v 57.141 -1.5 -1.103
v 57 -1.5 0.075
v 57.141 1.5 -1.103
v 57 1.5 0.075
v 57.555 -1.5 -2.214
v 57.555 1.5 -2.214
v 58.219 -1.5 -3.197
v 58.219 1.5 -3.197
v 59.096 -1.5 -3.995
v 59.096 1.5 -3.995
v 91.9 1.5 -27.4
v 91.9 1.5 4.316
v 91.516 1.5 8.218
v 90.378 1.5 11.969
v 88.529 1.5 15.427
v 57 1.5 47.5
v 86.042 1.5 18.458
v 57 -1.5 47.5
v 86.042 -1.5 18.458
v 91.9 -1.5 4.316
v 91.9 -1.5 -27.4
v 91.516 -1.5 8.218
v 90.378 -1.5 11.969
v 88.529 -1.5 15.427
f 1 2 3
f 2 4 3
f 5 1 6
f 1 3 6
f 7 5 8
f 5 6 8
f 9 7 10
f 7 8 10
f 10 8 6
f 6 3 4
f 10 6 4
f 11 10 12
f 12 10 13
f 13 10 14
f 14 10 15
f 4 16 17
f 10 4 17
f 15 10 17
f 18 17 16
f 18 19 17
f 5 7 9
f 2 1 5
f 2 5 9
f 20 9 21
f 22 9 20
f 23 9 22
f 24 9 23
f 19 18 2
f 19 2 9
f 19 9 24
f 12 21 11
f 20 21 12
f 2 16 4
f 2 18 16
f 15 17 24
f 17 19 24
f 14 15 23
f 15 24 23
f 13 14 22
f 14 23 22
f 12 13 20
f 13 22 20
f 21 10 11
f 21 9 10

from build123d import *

# Parameters (mm, degrees)
PAD008_DEPTH            = 1.5
FILLET010_R             = 20
FILLET011_R             = 5
BODY009_PLACEMENT_ANGLE = 90


with BuildPart() as part:
    # Sketch013 → Pad008 (new body, symmetric)
    with BuildSketch(Plane.YZ):
        Polygon((27, -2.5), (61.9, -27.4), (61.9, 12.6), (27, 47.5), align=None)
    extrude(amount=PAD008_DEPTH, both=True)

    # Fillet010
    fillet010_edges = [part.edges().sort_by_distance(p)[0] for p in [
        (0, 61.9, 12.6),
    ]]
    fillet(fillet010_edges, radius=FILLET010_R)

    # Fillet011
    fillet011_edges = [part.edges().sort_by_distance(p)[0] for p in [
        (0, 27, -2.5),
    ]]
    fillet(fillet011_edges, radius=FILLET011_R)


with BuildPart() as part_1:
    # Body009 placement: moved
    add(part.part.moved(Location((30, 0, 0))).rotate(Axis((30, 0, 0), (0, 0, -1)), BODY009_PLACEMENT_ANGLE))


solid = part_1.part
